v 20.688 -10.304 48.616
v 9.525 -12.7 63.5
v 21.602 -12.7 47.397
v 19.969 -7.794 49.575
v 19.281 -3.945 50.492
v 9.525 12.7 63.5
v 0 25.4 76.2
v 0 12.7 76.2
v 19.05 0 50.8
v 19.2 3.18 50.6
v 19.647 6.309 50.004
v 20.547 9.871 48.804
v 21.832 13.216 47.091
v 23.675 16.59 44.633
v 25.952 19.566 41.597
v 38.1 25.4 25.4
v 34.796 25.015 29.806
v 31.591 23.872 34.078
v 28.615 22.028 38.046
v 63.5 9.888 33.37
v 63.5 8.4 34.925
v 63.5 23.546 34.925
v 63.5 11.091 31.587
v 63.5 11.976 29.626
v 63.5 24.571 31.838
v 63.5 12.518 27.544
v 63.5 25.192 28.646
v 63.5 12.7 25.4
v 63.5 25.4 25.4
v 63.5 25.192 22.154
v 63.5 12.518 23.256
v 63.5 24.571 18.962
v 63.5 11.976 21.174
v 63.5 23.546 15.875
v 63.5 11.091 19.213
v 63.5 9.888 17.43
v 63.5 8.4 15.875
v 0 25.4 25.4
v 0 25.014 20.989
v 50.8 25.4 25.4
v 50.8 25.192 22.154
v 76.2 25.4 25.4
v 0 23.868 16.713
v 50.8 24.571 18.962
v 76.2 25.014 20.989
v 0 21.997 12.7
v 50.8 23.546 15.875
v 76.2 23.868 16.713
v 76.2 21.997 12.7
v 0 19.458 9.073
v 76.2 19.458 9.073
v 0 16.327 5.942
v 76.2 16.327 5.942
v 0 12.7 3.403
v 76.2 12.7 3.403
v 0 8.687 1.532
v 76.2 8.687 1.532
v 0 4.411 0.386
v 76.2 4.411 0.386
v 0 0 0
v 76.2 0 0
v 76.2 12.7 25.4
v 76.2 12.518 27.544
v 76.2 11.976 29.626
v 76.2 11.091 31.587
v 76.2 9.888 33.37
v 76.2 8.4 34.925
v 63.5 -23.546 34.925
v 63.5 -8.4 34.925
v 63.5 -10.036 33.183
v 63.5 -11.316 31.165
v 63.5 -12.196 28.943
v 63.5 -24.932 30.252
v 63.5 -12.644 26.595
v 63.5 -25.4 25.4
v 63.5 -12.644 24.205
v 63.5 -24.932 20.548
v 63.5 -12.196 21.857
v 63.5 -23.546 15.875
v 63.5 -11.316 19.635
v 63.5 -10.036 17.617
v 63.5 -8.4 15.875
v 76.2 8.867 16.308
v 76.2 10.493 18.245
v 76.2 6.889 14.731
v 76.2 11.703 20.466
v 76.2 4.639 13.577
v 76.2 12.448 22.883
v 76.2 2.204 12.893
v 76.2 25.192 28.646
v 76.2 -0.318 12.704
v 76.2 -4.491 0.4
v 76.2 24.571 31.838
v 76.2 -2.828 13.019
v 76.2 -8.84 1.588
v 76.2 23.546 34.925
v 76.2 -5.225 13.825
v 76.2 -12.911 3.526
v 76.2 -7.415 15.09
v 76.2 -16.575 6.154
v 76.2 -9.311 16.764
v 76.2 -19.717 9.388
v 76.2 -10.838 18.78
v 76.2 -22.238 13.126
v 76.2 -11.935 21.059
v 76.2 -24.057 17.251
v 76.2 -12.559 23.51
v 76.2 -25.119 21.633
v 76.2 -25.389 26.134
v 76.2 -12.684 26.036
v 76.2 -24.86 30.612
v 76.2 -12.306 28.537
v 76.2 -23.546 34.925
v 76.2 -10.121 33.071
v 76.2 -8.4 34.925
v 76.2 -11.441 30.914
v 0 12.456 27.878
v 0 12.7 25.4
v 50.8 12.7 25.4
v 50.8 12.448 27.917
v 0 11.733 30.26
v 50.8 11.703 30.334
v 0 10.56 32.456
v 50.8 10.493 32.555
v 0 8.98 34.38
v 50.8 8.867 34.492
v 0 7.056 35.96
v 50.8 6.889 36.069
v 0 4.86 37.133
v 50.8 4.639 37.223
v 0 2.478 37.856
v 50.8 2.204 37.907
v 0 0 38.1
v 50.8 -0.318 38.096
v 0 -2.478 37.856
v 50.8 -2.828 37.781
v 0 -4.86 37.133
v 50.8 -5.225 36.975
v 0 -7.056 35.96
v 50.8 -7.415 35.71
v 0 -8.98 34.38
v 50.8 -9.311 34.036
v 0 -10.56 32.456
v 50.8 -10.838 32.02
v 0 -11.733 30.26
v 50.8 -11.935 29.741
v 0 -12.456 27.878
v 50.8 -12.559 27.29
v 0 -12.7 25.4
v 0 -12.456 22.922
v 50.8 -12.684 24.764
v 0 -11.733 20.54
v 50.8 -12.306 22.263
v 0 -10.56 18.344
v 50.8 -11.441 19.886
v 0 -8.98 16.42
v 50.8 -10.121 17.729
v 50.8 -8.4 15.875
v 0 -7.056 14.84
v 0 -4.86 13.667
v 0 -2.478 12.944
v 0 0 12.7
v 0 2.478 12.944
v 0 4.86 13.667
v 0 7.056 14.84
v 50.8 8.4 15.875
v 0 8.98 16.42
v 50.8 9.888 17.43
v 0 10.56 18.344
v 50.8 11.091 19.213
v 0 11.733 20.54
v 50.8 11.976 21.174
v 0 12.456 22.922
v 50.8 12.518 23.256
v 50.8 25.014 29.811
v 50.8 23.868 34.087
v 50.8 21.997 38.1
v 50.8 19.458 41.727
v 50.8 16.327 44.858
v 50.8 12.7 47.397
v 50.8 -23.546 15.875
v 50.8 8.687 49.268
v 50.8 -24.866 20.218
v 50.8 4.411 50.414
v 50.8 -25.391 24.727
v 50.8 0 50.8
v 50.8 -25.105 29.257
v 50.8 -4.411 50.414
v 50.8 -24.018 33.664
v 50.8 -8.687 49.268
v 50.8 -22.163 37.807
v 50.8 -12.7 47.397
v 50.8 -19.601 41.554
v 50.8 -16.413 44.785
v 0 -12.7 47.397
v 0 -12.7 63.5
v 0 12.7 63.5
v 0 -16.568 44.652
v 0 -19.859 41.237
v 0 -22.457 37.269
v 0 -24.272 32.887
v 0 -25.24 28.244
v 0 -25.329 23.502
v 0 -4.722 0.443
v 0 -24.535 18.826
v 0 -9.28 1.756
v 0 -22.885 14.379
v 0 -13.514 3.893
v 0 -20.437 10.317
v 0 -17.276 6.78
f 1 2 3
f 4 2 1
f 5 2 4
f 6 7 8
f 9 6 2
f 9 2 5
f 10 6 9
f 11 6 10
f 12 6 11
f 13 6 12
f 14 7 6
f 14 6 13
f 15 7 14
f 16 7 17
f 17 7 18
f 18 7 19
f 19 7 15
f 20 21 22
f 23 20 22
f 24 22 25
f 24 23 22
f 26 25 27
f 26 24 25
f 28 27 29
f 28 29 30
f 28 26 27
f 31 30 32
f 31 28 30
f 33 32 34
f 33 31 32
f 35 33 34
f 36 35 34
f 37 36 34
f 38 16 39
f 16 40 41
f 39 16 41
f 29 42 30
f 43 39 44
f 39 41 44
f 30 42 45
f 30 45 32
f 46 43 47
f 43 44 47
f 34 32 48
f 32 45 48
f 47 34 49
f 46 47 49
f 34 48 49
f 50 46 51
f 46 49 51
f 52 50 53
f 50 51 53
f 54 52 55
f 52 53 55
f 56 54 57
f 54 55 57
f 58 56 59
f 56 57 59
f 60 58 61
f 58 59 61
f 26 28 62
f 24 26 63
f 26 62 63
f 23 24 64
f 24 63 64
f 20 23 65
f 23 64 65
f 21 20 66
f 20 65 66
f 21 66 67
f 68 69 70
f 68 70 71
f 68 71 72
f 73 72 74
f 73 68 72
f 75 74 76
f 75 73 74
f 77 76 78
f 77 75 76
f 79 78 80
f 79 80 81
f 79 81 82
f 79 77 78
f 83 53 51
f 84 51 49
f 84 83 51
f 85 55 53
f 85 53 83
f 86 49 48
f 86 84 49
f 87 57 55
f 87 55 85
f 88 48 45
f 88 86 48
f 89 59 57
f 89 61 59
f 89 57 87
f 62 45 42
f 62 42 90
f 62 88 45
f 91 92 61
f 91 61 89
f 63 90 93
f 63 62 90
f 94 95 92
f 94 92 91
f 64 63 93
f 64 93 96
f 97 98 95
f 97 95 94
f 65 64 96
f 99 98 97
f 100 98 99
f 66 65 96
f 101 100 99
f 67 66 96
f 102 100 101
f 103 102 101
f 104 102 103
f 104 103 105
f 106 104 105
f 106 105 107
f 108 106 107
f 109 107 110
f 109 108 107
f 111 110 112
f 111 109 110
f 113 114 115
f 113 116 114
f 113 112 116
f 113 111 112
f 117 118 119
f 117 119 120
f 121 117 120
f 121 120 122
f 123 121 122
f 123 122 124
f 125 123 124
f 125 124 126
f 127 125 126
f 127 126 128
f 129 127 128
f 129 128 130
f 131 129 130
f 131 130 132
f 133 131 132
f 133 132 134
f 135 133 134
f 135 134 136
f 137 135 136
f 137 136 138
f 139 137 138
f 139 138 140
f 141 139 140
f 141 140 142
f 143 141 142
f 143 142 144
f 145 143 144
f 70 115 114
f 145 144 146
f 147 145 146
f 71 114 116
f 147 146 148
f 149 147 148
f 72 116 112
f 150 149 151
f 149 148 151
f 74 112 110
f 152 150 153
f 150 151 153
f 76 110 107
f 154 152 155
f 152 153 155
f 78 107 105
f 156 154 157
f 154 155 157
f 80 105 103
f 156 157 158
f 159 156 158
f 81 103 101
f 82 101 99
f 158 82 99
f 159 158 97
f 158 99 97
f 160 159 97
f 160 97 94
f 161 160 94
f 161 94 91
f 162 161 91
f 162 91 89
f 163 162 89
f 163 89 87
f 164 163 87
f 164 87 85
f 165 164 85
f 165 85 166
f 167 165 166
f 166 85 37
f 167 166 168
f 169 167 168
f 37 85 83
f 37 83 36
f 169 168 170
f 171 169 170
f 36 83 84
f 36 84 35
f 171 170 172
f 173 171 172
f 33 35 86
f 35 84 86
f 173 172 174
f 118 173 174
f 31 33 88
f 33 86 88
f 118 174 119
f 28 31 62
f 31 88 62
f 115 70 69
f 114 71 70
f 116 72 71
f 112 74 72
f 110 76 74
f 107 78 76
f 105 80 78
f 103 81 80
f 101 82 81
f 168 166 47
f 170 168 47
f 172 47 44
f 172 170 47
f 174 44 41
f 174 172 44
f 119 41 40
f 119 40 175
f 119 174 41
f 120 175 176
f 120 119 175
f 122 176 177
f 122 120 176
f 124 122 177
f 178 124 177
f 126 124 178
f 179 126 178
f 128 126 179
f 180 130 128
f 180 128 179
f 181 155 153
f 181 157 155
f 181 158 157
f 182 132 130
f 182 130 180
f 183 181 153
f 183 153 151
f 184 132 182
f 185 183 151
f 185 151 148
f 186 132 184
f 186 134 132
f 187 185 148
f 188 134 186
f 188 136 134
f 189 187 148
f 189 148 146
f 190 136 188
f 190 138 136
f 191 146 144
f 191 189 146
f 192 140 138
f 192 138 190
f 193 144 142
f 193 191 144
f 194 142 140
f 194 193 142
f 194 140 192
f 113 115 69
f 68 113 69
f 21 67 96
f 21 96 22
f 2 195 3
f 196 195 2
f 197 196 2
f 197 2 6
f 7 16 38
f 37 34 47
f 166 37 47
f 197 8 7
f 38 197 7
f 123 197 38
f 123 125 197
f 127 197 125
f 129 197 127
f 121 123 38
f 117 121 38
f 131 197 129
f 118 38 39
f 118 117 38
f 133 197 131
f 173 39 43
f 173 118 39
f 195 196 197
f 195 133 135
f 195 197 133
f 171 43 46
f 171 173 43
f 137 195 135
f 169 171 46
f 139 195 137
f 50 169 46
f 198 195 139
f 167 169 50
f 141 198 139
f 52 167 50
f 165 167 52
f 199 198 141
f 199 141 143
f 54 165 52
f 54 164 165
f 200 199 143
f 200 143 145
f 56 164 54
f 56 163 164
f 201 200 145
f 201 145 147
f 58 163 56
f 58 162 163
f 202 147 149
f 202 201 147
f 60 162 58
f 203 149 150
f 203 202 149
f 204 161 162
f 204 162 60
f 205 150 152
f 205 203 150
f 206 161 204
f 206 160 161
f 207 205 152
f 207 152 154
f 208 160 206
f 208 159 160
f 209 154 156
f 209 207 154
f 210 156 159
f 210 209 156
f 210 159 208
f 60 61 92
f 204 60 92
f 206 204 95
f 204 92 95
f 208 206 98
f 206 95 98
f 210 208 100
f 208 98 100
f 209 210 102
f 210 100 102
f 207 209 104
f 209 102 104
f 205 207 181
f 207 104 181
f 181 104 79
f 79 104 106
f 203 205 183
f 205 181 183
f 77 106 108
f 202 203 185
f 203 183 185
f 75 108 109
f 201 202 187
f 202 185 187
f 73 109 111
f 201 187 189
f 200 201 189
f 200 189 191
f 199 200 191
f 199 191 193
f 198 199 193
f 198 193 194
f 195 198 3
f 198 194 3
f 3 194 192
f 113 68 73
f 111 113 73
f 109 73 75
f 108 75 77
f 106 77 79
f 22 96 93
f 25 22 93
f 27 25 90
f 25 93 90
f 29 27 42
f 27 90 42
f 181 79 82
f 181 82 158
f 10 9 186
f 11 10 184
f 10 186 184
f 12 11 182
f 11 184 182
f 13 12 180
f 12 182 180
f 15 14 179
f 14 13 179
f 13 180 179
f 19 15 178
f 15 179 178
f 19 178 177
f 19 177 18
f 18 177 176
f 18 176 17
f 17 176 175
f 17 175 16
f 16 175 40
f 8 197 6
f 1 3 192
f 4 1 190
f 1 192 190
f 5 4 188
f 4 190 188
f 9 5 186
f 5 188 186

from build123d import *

# Parameters (mm, degrees)
F1_DEPTH  = 25.4
F3_DEPTH  = 76.201
F5_DEPTH  = 76.201
F7_DEPTH  = 31.75
F10_R     = 12.7
F11_DEPTH = 76.201
F13_DEPTH = 12.7
F15_DEPTH = 12.7


with BuildPart() as f1:
    # F0 (on Front) → F1 (new body, symmetric)
    with BuildSketch(Plane.XZ):
        Polygon((0, 47.625), (0, 0), (76.2, 0), (76.2, 34.925), (63.5, 34.925), (63.5, 15.875), (50.8, 15.875), (50.8, 50.8), (19.05, 50.8), (21.43125, 47.625), align=None)
        Polygon((0, 76.2), (0, 47.625), (21.43125, 47.625), (19.05, 50.8), align=None)
    extrude(amount=F1_DEPTH, both=True)

    # F2 (on face) → F3 (cut, through all)
    with BuildSketch(Plane.YZ.offset(76.2)):
        with BuildLine():
            Line((-25.4, 0), (-1.82e-08, 0))
            ThreePointArc((-1.82e-08, 0), (-17.9605122486, 7.4394877643), (-25.4, 25.4))
            Line((-25.4, 25.4), (-25.4, 0))
        make_face()
        with BuildLine():
            Line((25.4, 0), (25.4, 25.4))
            ThreePointArc((25.4, 25.4), (17.9605122357, 7.4394877514), (-1.82e-08, 0))
            Line((-1.82e-08, 0), (25.4, 0))
        make_face()
    extrude(amount=-F3_DEPTH, mode=Mode.SUBTRACT)

    # F4 (on Right) → F5 (cut, through all)
    with BuildSketch(Plane.YZ):
        with BuildLine():
            Line((12.7, 63.5), (12.7, 76.2))
            Line((12.7, 76.2), (-25.4, 76.2))
            Line((-25.4, 76.2), (-25.4, 25.4))
            ThreePointArc((-25.4, 25.4), (-21.9970452561, 38.1), (-12.7, 47.3970452561))
            Line((-12.7, 47.3970452561), (-12.7, 63.5))
            Line((-12.7, 63.5), (12.7, 63.5))
        make_face()
    extrude(amount=F5_DEPTH, mode=Mode.SUBTRACT)

    # F6 (on face) → F7 (cut)
    with BuildSketch(Plane.YZ.offset(50.8)):
        with BuildLine():
            ThreePointArc((6.88e-08, 50.8), (17.9605122665, 43.3605122178), (25.4, 25.4))
            Line((25.4, 25.4), (25.4, 50.8))
            Line((25.4, 50.8), (6.88e-08, 50.8))
        make_face()
        with BuildLine():
            ThreePointArc((-12.7, 47.3970452561), (-6.5740037124, 49.9345159966), (6.88e-08, 50.8))
            Line((6.88e-08, 50.8), (-12.7, 50.8))
            Line((-12.7, 50.8), (-12.7, 47.3970452561))
        make_face()
    extrude(amount=-F7_DEPTH, mode=Mode.SUBTRACT)

    # F8 (on face) → F9 (join, up to the next surface of F1)
    with BuildSketch(Plane(origin=(0, 25.4, 0), x_dir=(-1, 0, 0), z_dir=(0, 1, 0))):
        Polygon((-38.1, 25.4), (-19.05, 25.4), (-19.05, 50.8), align=None)
    extrude(until=Until.NEXT, dir=(0, -1, 0))

    # F10 (on face) → F11 (cut, through all)
    with BuildSketch(Plane.YZ.offset(76.2)):
        with Locations((0, 25.4)):
            Circle(F10_R)
    extrude(amount=-F11_DEPTH, mode=Mode.SUBTRACT)

    # F12 (on face) → F13 (cut)
    with BuildSketch(Plane.YZ.offset(76.2)):
        with BuildLine():
            ThreePointArc((23.5464301965, 34.925), (24.9323016085, 30.2518384664), (25.4, 25.4))
            Line((25.4, 25.4), (25.4, 34.925))
            Line((25.4, 34.925), (23.5464301965, 34.925))
        make_face()
    extrude(amount=-F13_DEPTH, mode=Mode.SUBTRACT)

    # F14 (on face) → F15 (join)
    with BuildSketch(Plane.XZ.offset(12.7)):
        Polygon((0, 63.5), (0, 47.3970452561), (21.6022160579, 47.3970452561), (9.525, 63.5), align=None)
    extrude(amount=-F15_DEPTH)


solid = f1.part
